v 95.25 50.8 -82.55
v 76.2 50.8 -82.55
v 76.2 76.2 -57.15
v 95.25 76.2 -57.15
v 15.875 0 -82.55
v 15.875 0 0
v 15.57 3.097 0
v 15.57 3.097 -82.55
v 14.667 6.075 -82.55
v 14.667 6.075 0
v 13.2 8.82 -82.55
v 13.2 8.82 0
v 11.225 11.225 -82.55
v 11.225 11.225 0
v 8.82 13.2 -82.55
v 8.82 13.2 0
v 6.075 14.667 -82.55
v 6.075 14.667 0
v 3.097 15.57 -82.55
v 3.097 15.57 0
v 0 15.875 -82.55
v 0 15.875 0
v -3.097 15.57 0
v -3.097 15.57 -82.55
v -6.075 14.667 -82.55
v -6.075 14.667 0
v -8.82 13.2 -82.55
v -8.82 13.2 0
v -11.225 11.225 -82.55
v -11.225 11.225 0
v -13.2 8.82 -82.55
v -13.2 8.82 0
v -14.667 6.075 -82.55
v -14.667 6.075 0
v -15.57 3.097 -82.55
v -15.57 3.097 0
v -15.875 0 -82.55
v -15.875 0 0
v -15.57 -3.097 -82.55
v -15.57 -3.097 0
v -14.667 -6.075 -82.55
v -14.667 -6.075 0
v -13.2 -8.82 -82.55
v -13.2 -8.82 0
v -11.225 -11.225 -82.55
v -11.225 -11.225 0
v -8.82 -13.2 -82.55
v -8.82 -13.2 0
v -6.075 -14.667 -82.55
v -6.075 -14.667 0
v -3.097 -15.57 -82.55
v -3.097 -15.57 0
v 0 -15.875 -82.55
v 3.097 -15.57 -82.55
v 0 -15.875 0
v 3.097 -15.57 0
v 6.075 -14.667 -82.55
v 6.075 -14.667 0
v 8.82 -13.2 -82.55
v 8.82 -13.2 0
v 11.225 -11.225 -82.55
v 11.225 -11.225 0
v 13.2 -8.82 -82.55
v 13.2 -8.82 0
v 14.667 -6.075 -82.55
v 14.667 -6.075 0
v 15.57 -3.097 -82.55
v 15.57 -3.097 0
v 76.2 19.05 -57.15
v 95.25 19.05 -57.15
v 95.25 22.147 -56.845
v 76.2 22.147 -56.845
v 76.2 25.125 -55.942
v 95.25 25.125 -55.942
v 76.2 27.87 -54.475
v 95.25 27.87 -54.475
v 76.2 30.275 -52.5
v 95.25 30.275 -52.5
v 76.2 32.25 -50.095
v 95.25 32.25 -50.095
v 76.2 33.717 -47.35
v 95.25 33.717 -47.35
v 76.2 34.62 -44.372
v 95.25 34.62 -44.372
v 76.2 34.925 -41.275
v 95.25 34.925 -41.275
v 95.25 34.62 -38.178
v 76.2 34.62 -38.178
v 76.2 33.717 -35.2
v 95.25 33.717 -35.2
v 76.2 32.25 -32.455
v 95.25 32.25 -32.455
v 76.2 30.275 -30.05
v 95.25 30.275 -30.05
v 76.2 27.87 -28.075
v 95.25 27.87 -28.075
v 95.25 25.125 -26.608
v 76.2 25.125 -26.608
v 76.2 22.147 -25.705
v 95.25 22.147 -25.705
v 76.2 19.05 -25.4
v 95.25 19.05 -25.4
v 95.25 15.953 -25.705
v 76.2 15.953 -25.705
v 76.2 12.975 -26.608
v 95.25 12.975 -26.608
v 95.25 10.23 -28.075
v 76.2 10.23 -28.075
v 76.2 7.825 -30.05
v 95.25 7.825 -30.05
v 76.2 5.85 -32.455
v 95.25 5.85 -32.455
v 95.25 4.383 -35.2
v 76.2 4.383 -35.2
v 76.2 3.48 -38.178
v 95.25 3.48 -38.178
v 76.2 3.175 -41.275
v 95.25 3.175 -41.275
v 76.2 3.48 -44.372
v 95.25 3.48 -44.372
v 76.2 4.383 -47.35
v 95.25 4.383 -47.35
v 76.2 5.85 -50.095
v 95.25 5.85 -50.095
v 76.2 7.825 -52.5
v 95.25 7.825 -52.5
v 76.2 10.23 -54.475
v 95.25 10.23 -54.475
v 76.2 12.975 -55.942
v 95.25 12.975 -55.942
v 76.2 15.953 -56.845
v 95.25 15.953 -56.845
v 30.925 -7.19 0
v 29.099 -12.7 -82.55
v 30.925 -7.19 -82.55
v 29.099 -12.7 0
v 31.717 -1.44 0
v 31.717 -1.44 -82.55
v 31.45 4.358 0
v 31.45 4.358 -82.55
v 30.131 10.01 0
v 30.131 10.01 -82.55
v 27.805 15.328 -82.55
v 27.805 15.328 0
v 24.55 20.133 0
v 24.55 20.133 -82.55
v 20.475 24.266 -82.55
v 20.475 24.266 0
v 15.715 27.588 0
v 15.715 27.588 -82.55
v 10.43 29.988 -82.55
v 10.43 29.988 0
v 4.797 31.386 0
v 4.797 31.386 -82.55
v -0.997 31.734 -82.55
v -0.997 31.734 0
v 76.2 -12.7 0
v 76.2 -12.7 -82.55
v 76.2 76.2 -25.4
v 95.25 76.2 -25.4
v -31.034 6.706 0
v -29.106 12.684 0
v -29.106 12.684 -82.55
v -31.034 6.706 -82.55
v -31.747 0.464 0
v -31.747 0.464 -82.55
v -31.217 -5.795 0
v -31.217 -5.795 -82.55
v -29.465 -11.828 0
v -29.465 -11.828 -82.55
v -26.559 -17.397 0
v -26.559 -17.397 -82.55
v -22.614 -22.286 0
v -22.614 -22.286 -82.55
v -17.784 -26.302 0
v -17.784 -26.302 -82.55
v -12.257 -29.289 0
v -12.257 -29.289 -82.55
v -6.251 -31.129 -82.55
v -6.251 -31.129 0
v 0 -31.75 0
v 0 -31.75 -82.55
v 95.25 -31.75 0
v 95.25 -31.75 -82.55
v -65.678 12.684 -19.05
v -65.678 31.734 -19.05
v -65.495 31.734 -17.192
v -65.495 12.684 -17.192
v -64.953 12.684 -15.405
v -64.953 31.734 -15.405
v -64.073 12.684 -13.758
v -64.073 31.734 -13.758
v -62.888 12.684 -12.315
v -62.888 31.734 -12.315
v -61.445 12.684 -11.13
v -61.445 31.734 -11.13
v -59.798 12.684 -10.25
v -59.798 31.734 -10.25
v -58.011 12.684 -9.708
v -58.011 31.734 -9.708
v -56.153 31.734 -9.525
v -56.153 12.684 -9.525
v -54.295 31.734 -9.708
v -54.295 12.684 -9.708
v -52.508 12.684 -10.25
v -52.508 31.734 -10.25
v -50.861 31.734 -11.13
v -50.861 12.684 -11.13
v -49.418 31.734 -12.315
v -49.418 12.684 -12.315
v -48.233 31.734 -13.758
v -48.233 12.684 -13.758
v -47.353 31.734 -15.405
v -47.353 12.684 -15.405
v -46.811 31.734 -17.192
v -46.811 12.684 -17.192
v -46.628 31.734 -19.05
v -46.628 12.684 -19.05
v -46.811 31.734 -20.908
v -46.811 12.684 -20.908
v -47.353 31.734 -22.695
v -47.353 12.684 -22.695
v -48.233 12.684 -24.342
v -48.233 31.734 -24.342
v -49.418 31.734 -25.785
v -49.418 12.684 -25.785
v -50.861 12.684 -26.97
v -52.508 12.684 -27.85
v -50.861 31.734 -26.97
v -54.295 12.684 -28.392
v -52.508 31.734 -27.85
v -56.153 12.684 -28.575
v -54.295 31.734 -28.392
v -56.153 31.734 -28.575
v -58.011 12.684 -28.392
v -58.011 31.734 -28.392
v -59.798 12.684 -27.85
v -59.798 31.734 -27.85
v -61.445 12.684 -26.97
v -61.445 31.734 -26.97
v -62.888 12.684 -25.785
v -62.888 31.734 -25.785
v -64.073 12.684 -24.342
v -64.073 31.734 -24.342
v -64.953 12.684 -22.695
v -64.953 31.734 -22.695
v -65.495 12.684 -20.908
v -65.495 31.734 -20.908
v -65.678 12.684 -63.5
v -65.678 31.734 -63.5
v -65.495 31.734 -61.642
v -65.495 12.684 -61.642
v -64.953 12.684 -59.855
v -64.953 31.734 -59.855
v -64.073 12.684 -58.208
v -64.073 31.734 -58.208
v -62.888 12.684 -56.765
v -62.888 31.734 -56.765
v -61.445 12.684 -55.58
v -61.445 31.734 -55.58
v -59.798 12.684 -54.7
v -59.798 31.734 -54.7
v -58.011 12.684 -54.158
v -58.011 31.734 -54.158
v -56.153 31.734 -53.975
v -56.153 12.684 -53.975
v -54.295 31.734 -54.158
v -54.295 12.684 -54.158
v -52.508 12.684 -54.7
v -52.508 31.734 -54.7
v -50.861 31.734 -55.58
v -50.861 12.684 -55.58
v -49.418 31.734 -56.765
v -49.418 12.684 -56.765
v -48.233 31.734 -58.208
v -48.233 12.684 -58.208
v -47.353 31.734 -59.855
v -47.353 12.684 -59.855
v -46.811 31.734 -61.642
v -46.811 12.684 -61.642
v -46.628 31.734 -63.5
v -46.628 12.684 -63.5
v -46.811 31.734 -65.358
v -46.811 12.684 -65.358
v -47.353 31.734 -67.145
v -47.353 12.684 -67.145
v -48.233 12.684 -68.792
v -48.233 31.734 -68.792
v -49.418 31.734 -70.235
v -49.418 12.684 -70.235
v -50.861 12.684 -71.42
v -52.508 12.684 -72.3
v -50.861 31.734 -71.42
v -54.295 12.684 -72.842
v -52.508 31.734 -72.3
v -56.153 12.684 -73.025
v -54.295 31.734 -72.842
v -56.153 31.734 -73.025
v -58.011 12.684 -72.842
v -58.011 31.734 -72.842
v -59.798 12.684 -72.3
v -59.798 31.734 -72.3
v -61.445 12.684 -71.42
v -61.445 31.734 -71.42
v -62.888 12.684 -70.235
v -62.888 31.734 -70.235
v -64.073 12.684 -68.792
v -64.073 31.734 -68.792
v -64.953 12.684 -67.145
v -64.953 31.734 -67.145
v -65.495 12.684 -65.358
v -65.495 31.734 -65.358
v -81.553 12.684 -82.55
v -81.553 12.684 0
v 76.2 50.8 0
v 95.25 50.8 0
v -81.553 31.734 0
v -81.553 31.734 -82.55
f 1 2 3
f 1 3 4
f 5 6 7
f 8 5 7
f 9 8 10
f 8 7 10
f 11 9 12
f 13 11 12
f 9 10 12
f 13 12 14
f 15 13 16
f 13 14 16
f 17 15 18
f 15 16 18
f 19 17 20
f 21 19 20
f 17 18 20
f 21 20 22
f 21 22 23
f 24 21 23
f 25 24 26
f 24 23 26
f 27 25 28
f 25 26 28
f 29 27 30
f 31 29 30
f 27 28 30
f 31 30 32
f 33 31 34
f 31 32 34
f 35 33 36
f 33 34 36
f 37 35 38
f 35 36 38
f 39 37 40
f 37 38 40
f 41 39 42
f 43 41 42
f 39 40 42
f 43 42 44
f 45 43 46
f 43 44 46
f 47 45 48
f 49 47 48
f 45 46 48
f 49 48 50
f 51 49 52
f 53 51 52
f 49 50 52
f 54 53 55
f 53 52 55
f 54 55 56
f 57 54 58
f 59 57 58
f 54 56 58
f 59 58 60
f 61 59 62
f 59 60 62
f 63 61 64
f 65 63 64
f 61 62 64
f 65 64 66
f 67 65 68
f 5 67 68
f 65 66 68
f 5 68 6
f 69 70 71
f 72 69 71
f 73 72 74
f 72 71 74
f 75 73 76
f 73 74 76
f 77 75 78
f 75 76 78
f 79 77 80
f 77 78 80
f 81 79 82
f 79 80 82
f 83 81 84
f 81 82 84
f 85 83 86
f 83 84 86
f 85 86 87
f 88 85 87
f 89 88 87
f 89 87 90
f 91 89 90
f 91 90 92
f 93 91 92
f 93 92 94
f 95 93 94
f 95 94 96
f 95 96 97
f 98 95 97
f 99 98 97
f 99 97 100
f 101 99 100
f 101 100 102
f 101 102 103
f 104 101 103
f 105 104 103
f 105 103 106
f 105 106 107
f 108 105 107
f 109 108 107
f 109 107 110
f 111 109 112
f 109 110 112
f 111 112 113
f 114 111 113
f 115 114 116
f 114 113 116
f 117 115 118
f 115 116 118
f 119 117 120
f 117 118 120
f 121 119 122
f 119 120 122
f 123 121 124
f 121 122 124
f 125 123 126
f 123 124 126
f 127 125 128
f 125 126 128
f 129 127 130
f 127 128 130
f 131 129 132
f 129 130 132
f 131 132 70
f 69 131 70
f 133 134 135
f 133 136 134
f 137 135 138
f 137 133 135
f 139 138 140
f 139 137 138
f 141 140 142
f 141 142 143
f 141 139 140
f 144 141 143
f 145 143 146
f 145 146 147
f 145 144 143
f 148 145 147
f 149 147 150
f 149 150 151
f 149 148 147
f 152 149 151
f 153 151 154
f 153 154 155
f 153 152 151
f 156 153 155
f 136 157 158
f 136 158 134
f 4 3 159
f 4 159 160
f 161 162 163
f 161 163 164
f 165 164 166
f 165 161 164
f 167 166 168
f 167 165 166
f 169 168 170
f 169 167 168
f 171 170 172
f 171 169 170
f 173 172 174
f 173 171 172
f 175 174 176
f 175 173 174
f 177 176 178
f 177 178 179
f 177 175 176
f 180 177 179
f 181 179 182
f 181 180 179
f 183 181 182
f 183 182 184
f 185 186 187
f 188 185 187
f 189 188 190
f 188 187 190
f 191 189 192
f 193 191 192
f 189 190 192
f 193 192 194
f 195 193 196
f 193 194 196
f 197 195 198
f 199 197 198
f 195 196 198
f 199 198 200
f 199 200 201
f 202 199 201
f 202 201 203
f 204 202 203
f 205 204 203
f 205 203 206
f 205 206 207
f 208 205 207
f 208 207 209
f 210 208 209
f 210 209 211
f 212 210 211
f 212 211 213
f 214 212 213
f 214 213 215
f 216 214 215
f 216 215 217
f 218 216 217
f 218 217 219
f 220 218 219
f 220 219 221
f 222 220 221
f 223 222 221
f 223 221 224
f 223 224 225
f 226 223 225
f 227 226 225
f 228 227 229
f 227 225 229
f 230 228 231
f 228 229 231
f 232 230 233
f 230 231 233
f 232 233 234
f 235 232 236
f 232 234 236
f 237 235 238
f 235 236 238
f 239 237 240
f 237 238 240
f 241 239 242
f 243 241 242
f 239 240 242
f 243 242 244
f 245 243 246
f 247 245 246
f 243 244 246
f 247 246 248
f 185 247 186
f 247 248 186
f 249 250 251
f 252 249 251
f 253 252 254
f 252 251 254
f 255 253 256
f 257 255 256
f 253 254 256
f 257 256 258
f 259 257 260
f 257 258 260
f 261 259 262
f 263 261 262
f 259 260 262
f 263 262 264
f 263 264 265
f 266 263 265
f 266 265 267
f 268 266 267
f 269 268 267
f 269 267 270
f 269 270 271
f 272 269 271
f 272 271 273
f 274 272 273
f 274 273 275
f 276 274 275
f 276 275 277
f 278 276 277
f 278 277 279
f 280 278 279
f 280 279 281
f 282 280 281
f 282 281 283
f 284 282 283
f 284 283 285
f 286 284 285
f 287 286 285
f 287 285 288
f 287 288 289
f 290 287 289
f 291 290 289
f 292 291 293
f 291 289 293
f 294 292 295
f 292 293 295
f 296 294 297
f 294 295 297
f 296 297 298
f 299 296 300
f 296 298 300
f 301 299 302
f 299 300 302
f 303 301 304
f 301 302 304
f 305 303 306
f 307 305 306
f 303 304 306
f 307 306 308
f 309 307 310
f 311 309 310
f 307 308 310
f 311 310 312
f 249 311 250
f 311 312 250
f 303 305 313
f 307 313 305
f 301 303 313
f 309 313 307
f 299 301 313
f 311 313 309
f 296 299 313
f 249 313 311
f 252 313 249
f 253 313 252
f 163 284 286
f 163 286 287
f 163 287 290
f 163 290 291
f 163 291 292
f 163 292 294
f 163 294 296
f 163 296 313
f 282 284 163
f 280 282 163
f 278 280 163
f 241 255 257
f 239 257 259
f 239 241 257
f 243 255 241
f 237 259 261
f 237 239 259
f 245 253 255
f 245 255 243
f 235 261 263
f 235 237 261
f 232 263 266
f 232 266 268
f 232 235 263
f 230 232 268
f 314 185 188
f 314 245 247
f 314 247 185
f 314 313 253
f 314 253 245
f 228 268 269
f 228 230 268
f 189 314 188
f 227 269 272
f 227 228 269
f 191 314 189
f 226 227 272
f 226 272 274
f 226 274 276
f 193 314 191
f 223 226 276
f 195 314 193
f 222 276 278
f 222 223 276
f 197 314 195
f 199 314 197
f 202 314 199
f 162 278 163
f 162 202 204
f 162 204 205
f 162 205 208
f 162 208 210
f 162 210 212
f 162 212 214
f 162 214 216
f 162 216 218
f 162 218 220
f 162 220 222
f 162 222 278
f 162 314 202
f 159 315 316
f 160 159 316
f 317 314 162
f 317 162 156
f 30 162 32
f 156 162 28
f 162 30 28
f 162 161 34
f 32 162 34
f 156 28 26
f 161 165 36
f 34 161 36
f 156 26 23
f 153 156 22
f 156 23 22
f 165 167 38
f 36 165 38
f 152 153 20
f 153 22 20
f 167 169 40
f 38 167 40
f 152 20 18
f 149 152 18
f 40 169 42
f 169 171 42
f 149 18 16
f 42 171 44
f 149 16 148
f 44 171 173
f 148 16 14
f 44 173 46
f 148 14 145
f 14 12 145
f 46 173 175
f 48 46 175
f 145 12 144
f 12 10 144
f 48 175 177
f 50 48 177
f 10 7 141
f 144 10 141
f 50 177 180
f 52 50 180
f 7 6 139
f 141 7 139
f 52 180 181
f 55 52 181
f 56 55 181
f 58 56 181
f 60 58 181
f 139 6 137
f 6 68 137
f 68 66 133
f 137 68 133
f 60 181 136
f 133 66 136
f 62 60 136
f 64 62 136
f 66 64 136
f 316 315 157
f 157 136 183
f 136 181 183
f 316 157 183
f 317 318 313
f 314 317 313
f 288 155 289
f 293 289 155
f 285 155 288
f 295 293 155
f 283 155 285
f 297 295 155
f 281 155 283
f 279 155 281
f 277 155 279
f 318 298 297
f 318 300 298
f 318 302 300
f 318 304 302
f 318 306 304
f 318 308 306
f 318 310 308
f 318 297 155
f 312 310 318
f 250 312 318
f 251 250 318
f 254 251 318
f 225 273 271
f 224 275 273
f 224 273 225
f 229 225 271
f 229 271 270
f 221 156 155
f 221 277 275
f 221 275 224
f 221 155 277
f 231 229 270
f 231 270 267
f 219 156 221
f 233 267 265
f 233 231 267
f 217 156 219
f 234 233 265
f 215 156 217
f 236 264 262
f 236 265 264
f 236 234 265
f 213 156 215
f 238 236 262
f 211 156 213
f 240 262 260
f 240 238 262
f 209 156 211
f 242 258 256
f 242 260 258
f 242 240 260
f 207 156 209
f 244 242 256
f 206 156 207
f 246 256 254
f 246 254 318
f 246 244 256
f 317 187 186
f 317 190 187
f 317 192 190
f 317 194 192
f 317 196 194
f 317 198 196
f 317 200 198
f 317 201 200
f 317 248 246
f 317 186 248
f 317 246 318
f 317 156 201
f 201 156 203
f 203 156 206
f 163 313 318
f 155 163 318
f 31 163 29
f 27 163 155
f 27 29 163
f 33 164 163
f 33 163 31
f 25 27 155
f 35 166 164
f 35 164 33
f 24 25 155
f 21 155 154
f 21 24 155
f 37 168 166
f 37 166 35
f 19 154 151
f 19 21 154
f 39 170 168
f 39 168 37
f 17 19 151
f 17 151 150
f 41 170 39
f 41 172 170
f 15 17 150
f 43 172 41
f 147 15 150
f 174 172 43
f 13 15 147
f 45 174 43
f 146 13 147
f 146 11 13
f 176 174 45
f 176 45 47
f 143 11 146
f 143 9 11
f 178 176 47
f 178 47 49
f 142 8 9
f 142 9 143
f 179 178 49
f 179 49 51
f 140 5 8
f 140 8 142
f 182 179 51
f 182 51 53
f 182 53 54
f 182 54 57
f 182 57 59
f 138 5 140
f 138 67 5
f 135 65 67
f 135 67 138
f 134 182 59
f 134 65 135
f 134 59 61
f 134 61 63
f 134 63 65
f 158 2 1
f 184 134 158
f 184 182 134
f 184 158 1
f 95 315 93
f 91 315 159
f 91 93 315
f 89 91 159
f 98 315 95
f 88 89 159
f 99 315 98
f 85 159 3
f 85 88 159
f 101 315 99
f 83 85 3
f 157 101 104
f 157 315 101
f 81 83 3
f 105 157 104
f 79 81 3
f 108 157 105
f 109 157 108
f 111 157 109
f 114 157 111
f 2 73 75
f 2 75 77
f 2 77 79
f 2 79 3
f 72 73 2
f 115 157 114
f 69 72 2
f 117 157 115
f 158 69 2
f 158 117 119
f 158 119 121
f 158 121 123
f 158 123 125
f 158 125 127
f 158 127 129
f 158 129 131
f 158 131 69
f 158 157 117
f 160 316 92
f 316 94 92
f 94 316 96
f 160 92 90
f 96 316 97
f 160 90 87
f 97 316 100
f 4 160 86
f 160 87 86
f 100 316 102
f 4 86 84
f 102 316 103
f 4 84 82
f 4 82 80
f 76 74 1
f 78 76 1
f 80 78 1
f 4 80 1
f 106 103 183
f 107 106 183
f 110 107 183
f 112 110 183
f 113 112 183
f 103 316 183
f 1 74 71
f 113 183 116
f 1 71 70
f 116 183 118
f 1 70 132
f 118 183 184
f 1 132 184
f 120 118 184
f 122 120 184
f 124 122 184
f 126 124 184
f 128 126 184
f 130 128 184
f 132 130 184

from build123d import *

# Parameters (mm, degrees)
SKETCH1_R           = 31.75
SKETCH1_R_2         = 15.875
BOSS_EXTRUDE1_DEPTH = 82.55
BOSS_EXTRUDE2_DEPTH = 82.55
SKETCH4_R           = 9.525
CUT_EXTRUDE1_DEPTH  = 82.55
SKETCH5_W           = 19.05
SKETCH5_H           = 82.55
BOSS_EXTRUDE3_DEPTH = 88.9
CHAMFER1_SIZE       = 25.4
CUT_EXTRUDE2_REACH  = 211.476
SKETCH6_R           = 15.875


with BuildPart() as part:
    # Sketch1 → Boss-Extrude1 (new body)
    with BuildSketch(Plane.XY):
        Circle(SKETCH1_R)
        Circle(SKETCH1_R_2, mode=Mode.SUBTRACT)
    extrude(amount=-BOSS_EXTRUDE1_DEPTH)

    # Sketch3 → Boss-Extrude2 (add)
    with BuildSketch(Plane.XY):
        Polygon((0.997093544, 31.734339515), (-81.552906456, 31.734339515), (-81.552906456, 12.684339515), (-29.106185443, 12.684339515), align=None)
        Polygon((0, -31.75), (95.25, -31.75), (95.25, -12.7), (29.099355663, -12.7), align=None)
    extrude(amount=-BOSS_EXTRUDE2_DEPTH)

    # Sketch4 → Cut-Extrude1 (cut)
    with BuildSketch(Plane(origin=(0, 31.734339515, 0), x_dir=(1, 0, 0), z_dir=(0, 1, 0))):
        with Locations(Location((-56.152906456, 63.5, 0), (0, 0, 180))):
            Circle(SKETCH4_R)
        with Locations(Location((-56.152906456, 19.05, 0), (0, 0, 180))):
            Circle(SKETCH4_R)
    extrude(amount=-CUT_EXTRUDE1_DEPTH, mode=Mode.SUBTRACT)

    # Sketch5 → Boss-Extrude3 (add)
    with BuildSketch(Plane(origin=(0, -12.7, 0), x_dir=(1, 0, 0), z_dir=(0, 1, 0))):
        with Locations((85.725, 41.275)):
            Rectangle(SKETCH5_W, SKETCH5_H)
    extrude(amount=BOSS_EXTRUDE3_DEPTH)

    # Chamfer1
    chamfer1_edges = [part.edges().sort_by_distance(p)[0] for p in [
        (85.725, 76.2, -82.55),
        (85.725, 76.2, 0),
    ]]
    chamfer(chamfer1_edges, length=CHAMFER1_SIZE)

    # Sketch6 → Cut-Extrude2 (cut, up to next)
    with BuildSketch(Plane(origin=(95.25, 0, 0), x_dir=(0, 0, -1), z_dir=(1, 0, 0)), mode=Mode.PRIVATE) as cut_extrude2_sk1:
        with Locations((41.275, 19.05)):
            Circle(SKETCH6_R)
    cut_extrude2_tool1 = extrude(cut_extrude2_sk1.sketch, amount=-CUT_EXTRUDE2_REACH, mode=Mode.PRIVATE) & part.part
    add(cut_extrude2_tool1.solids().sort_by_distance((95.25, 19.05, -41.275))[0], mode=Mode.SUBTRACT)


solid = part.part
